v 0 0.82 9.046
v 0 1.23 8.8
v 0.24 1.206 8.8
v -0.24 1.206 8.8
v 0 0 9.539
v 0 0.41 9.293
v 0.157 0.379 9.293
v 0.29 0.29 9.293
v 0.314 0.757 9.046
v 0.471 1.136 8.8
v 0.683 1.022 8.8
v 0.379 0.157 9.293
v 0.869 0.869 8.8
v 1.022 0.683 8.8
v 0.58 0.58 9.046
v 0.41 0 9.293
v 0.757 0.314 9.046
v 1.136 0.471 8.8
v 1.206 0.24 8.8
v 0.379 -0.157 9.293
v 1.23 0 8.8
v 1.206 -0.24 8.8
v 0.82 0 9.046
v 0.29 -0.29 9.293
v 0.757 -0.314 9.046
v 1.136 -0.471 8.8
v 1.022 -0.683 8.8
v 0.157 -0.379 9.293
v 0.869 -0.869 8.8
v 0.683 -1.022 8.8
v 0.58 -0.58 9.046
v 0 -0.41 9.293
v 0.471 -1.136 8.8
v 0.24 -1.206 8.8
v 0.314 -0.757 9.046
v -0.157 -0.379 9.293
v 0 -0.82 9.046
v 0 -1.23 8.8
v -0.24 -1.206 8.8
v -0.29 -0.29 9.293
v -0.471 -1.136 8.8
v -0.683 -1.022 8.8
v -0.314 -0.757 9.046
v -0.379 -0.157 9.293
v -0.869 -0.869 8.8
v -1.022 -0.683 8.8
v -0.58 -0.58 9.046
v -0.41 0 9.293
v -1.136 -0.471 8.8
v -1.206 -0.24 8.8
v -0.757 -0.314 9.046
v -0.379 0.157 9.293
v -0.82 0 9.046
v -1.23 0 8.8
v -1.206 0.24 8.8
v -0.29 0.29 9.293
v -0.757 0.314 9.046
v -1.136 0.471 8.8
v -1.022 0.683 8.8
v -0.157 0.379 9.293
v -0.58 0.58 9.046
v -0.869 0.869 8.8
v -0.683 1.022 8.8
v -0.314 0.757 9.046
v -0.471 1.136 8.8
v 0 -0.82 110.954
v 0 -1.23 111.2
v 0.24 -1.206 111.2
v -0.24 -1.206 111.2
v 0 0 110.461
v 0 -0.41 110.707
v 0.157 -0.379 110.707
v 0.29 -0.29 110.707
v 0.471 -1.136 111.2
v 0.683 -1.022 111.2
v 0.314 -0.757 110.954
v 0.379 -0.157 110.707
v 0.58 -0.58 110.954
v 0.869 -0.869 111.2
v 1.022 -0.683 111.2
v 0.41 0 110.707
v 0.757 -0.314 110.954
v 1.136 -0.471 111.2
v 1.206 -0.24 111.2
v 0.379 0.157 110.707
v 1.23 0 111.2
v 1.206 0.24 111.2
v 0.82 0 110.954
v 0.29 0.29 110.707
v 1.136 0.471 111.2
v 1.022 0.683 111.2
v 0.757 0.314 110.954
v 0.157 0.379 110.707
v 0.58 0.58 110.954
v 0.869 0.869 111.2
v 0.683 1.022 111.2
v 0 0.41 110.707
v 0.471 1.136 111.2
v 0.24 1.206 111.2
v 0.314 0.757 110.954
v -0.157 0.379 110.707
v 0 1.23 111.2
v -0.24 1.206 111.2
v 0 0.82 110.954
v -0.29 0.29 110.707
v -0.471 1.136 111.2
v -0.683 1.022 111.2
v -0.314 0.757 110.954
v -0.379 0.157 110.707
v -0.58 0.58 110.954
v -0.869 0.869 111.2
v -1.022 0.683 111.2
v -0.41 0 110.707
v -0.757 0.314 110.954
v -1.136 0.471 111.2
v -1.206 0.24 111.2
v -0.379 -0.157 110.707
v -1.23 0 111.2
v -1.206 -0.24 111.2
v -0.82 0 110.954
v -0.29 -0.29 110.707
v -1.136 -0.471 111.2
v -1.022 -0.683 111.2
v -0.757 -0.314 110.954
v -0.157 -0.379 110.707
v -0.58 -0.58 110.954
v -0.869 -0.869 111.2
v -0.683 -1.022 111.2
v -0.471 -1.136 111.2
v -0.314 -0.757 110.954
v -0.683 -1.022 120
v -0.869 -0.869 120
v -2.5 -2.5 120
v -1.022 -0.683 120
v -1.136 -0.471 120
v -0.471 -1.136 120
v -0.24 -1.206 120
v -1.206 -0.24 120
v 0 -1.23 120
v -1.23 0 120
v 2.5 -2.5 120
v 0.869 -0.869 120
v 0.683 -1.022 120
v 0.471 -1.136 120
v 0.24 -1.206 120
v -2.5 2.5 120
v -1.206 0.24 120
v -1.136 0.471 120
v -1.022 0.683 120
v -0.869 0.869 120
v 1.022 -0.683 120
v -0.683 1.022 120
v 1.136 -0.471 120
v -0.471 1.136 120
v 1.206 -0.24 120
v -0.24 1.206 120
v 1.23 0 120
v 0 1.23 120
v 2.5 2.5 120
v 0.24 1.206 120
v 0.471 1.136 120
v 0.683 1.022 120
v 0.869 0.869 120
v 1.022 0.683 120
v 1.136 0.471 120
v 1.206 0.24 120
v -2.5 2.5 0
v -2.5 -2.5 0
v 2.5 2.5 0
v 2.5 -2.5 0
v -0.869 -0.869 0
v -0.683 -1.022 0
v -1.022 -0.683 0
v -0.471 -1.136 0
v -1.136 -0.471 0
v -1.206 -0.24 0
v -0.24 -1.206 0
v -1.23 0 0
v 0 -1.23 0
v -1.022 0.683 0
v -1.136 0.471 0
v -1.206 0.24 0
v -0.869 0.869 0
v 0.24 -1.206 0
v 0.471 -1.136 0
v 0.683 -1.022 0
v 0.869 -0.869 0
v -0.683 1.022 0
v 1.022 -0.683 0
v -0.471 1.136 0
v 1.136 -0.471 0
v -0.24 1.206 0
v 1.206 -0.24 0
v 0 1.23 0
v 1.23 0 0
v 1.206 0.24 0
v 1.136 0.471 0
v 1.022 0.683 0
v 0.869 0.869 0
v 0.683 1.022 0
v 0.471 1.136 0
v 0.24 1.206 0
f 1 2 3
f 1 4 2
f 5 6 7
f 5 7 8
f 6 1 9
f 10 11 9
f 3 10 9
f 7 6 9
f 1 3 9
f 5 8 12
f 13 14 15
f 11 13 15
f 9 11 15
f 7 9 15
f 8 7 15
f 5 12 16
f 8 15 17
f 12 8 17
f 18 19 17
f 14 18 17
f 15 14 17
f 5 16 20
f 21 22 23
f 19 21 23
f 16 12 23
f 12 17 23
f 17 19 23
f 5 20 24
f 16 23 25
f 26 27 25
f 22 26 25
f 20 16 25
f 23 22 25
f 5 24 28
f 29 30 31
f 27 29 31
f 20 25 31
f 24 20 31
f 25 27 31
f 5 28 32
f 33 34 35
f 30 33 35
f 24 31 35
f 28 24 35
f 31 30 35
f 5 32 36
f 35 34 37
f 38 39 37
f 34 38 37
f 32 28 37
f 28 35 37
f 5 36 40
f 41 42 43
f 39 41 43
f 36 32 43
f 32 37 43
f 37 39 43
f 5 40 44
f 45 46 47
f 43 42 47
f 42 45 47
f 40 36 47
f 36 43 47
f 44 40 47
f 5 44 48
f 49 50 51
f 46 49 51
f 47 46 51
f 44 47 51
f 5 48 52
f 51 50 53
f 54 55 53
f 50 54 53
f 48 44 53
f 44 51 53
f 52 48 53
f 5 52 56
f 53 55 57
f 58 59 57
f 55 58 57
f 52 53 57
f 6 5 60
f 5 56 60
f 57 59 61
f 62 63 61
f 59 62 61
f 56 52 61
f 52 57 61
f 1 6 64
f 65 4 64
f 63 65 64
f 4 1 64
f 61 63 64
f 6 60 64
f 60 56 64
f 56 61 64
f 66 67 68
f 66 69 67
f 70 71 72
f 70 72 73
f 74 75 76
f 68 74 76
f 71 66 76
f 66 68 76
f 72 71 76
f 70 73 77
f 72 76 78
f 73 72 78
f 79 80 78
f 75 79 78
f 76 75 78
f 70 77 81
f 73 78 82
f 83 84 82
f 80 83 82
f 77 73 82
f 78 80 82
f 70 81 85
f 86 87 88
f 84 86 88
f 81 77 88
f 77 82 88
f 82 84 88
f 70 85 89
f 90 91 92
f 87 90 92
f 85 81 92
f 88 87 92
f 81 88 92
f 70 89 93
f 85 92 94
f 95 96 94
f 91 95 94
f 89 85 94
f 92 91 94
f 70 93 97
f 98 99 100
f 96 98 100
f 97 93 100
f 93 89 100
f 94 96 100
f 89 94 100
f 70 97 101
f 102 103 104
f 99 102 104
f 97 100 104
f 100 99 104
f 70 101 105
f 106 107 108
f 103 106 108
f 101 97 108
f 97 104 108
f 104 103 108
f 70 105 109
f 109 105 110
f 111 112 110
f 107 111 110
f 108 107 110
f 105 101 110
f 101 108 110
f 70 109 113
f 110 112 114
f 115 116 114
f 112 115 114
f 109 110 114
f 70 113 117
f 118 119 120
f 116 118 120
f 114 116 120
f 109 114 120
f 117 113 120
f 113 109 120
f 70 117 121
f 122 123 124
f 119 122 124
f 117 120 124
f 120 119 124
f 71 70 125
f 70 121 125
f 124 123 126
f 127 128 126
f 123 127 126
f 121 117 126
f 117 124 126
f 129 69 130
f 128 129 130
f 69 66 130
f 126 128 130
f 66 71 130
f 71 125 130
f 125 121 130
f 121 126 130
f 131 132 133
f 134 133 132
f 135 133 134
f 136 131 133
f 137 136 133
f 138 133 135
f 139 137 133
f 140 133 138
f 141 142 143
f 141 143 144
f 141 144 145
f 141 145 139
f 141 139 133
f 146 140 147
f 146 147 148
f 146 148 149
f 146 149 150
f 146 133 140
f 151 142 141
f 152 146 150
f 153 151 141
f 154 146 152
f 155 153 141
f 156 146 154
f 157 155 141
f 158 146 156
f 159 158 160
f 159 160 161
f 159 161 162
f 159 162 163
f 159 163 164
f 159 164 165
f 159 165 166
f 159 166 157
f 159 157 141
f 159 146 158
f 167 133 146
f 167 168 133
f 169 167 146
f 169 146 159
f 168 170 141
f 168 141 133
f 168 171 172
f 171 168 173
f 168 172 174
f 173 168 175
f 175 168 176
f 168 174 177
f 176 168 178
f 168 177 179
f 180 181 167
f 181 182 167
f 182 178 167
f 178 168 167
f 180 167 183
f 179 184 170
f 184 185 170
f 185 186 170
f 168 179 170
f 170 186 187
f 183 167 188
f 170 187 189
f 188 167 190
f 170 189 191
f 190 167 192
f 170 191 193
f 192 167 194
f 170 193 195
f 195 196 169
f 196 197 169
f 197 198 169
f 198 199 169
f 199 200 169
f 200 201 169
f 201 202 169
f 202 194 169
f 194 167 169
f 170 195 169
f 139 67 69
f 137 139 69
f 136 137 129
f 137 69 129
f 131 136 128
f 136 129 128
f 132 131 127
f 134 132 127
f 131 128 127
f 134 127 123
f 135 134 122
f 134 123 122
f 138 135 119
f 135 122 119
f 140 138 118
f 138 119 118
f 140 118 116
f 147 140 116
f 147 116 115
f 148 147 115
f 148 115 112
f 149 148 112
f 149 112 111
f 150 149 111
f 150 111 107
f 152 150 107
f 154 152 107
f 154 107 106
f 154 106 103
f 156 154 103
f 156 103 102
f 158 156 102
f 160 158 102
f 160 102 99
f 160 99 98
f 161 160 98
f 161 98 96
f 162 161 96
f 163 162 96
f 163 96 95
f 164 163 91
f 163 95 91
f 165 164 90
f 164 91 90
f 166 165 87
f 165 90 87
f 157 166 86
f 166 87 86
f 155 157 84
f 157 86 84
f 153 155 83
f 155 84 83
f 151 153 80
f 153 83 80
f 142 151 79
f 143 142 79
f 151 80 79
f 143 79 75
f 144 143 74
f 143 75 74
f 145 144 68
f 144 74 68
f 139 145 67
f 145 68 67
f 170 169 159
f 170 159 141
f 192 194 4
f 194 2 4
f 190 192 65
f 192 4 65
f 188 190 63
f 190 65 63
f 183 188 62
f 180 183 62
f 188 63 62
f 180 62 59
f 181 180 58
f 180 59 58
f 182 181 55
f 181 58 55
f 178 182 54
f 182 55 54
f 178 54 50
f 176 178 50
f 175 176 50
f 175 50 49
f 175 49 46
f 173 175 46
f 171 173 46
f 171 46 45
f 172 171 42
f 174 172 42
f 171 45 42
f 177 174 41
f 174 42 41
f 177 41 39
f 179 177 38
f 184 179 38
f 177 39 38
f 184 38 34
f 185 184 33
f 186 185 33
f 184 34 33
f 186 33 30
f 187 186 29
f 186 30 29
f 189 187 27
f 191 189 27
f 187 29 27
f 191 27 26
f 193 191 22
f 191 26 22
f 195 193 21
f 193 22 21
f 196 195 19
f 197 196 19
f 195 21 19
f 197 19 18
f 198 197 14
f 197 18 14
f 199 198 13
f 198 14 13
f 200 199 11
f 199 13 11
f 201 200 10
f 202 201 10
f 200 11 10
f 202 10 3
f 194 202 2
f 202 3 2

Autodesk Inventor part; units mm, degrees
ref_plane "YZ Plane" through (0, 0, 0) normal (1, 0, 0) x (0, 1, 0)
ref_plane "XZ Plane" through (0, 0, 0) normal (0, 1, 0) x (-1, 0, 0)
ref_plane "XY Plane" through (0, 0, 0) normal (0, 0, 1) x (1, 0, 0)
sketch "スケッチ1" plane through (0, 0, 0) normal (0, 0, 1) x (1, 0, 0)
  line L0 (-2.5, 2.5) -> (2.5, 2.5)
  line L1 (2.5, 2.5) -> (2.5, -2.5)
  line L2 (2.5, -2.5) -> (-2.5, -2.5)
  line L3 (-2.5, -2.5) -> (-2.5, 2.5)
  point P0 (0, 0)
  point P1 (-2.5, 0)
  point P2 (0, 2.5)
  dimension "d4" = 5
  dimension "d5" = 5
extrude "押し出し1" add sketch "スケッチ1" along normal blind 120
sketch "スケッチ2" plane through (0, 0, 120) normal (0, 0, 1) x (1, 0, 0)
  point P0 (0, 0)
hole "穴1" at (0, 0, 120) direction (0, 0, -1) diameter 2.459 depth 8.8 tip angle 118 thread size "M3x0.5" class "6H" standard "ISO Metric profile"
sketch "スケッチ3" plane through (0, 0, 0) normal (0, 0, -1) x (-1, 0, 0)
  point P0 (0, 0)
  point P1 (0, 0)
hole "穴2" at (0, 0, 0) direction (0, 0, 1) diameter 2.459 depth 8.8 tip angle 118 thread size "M3x0.5" class "6H" standard "ISO Metric profile"
properties part number "回収機構スペーサ"
